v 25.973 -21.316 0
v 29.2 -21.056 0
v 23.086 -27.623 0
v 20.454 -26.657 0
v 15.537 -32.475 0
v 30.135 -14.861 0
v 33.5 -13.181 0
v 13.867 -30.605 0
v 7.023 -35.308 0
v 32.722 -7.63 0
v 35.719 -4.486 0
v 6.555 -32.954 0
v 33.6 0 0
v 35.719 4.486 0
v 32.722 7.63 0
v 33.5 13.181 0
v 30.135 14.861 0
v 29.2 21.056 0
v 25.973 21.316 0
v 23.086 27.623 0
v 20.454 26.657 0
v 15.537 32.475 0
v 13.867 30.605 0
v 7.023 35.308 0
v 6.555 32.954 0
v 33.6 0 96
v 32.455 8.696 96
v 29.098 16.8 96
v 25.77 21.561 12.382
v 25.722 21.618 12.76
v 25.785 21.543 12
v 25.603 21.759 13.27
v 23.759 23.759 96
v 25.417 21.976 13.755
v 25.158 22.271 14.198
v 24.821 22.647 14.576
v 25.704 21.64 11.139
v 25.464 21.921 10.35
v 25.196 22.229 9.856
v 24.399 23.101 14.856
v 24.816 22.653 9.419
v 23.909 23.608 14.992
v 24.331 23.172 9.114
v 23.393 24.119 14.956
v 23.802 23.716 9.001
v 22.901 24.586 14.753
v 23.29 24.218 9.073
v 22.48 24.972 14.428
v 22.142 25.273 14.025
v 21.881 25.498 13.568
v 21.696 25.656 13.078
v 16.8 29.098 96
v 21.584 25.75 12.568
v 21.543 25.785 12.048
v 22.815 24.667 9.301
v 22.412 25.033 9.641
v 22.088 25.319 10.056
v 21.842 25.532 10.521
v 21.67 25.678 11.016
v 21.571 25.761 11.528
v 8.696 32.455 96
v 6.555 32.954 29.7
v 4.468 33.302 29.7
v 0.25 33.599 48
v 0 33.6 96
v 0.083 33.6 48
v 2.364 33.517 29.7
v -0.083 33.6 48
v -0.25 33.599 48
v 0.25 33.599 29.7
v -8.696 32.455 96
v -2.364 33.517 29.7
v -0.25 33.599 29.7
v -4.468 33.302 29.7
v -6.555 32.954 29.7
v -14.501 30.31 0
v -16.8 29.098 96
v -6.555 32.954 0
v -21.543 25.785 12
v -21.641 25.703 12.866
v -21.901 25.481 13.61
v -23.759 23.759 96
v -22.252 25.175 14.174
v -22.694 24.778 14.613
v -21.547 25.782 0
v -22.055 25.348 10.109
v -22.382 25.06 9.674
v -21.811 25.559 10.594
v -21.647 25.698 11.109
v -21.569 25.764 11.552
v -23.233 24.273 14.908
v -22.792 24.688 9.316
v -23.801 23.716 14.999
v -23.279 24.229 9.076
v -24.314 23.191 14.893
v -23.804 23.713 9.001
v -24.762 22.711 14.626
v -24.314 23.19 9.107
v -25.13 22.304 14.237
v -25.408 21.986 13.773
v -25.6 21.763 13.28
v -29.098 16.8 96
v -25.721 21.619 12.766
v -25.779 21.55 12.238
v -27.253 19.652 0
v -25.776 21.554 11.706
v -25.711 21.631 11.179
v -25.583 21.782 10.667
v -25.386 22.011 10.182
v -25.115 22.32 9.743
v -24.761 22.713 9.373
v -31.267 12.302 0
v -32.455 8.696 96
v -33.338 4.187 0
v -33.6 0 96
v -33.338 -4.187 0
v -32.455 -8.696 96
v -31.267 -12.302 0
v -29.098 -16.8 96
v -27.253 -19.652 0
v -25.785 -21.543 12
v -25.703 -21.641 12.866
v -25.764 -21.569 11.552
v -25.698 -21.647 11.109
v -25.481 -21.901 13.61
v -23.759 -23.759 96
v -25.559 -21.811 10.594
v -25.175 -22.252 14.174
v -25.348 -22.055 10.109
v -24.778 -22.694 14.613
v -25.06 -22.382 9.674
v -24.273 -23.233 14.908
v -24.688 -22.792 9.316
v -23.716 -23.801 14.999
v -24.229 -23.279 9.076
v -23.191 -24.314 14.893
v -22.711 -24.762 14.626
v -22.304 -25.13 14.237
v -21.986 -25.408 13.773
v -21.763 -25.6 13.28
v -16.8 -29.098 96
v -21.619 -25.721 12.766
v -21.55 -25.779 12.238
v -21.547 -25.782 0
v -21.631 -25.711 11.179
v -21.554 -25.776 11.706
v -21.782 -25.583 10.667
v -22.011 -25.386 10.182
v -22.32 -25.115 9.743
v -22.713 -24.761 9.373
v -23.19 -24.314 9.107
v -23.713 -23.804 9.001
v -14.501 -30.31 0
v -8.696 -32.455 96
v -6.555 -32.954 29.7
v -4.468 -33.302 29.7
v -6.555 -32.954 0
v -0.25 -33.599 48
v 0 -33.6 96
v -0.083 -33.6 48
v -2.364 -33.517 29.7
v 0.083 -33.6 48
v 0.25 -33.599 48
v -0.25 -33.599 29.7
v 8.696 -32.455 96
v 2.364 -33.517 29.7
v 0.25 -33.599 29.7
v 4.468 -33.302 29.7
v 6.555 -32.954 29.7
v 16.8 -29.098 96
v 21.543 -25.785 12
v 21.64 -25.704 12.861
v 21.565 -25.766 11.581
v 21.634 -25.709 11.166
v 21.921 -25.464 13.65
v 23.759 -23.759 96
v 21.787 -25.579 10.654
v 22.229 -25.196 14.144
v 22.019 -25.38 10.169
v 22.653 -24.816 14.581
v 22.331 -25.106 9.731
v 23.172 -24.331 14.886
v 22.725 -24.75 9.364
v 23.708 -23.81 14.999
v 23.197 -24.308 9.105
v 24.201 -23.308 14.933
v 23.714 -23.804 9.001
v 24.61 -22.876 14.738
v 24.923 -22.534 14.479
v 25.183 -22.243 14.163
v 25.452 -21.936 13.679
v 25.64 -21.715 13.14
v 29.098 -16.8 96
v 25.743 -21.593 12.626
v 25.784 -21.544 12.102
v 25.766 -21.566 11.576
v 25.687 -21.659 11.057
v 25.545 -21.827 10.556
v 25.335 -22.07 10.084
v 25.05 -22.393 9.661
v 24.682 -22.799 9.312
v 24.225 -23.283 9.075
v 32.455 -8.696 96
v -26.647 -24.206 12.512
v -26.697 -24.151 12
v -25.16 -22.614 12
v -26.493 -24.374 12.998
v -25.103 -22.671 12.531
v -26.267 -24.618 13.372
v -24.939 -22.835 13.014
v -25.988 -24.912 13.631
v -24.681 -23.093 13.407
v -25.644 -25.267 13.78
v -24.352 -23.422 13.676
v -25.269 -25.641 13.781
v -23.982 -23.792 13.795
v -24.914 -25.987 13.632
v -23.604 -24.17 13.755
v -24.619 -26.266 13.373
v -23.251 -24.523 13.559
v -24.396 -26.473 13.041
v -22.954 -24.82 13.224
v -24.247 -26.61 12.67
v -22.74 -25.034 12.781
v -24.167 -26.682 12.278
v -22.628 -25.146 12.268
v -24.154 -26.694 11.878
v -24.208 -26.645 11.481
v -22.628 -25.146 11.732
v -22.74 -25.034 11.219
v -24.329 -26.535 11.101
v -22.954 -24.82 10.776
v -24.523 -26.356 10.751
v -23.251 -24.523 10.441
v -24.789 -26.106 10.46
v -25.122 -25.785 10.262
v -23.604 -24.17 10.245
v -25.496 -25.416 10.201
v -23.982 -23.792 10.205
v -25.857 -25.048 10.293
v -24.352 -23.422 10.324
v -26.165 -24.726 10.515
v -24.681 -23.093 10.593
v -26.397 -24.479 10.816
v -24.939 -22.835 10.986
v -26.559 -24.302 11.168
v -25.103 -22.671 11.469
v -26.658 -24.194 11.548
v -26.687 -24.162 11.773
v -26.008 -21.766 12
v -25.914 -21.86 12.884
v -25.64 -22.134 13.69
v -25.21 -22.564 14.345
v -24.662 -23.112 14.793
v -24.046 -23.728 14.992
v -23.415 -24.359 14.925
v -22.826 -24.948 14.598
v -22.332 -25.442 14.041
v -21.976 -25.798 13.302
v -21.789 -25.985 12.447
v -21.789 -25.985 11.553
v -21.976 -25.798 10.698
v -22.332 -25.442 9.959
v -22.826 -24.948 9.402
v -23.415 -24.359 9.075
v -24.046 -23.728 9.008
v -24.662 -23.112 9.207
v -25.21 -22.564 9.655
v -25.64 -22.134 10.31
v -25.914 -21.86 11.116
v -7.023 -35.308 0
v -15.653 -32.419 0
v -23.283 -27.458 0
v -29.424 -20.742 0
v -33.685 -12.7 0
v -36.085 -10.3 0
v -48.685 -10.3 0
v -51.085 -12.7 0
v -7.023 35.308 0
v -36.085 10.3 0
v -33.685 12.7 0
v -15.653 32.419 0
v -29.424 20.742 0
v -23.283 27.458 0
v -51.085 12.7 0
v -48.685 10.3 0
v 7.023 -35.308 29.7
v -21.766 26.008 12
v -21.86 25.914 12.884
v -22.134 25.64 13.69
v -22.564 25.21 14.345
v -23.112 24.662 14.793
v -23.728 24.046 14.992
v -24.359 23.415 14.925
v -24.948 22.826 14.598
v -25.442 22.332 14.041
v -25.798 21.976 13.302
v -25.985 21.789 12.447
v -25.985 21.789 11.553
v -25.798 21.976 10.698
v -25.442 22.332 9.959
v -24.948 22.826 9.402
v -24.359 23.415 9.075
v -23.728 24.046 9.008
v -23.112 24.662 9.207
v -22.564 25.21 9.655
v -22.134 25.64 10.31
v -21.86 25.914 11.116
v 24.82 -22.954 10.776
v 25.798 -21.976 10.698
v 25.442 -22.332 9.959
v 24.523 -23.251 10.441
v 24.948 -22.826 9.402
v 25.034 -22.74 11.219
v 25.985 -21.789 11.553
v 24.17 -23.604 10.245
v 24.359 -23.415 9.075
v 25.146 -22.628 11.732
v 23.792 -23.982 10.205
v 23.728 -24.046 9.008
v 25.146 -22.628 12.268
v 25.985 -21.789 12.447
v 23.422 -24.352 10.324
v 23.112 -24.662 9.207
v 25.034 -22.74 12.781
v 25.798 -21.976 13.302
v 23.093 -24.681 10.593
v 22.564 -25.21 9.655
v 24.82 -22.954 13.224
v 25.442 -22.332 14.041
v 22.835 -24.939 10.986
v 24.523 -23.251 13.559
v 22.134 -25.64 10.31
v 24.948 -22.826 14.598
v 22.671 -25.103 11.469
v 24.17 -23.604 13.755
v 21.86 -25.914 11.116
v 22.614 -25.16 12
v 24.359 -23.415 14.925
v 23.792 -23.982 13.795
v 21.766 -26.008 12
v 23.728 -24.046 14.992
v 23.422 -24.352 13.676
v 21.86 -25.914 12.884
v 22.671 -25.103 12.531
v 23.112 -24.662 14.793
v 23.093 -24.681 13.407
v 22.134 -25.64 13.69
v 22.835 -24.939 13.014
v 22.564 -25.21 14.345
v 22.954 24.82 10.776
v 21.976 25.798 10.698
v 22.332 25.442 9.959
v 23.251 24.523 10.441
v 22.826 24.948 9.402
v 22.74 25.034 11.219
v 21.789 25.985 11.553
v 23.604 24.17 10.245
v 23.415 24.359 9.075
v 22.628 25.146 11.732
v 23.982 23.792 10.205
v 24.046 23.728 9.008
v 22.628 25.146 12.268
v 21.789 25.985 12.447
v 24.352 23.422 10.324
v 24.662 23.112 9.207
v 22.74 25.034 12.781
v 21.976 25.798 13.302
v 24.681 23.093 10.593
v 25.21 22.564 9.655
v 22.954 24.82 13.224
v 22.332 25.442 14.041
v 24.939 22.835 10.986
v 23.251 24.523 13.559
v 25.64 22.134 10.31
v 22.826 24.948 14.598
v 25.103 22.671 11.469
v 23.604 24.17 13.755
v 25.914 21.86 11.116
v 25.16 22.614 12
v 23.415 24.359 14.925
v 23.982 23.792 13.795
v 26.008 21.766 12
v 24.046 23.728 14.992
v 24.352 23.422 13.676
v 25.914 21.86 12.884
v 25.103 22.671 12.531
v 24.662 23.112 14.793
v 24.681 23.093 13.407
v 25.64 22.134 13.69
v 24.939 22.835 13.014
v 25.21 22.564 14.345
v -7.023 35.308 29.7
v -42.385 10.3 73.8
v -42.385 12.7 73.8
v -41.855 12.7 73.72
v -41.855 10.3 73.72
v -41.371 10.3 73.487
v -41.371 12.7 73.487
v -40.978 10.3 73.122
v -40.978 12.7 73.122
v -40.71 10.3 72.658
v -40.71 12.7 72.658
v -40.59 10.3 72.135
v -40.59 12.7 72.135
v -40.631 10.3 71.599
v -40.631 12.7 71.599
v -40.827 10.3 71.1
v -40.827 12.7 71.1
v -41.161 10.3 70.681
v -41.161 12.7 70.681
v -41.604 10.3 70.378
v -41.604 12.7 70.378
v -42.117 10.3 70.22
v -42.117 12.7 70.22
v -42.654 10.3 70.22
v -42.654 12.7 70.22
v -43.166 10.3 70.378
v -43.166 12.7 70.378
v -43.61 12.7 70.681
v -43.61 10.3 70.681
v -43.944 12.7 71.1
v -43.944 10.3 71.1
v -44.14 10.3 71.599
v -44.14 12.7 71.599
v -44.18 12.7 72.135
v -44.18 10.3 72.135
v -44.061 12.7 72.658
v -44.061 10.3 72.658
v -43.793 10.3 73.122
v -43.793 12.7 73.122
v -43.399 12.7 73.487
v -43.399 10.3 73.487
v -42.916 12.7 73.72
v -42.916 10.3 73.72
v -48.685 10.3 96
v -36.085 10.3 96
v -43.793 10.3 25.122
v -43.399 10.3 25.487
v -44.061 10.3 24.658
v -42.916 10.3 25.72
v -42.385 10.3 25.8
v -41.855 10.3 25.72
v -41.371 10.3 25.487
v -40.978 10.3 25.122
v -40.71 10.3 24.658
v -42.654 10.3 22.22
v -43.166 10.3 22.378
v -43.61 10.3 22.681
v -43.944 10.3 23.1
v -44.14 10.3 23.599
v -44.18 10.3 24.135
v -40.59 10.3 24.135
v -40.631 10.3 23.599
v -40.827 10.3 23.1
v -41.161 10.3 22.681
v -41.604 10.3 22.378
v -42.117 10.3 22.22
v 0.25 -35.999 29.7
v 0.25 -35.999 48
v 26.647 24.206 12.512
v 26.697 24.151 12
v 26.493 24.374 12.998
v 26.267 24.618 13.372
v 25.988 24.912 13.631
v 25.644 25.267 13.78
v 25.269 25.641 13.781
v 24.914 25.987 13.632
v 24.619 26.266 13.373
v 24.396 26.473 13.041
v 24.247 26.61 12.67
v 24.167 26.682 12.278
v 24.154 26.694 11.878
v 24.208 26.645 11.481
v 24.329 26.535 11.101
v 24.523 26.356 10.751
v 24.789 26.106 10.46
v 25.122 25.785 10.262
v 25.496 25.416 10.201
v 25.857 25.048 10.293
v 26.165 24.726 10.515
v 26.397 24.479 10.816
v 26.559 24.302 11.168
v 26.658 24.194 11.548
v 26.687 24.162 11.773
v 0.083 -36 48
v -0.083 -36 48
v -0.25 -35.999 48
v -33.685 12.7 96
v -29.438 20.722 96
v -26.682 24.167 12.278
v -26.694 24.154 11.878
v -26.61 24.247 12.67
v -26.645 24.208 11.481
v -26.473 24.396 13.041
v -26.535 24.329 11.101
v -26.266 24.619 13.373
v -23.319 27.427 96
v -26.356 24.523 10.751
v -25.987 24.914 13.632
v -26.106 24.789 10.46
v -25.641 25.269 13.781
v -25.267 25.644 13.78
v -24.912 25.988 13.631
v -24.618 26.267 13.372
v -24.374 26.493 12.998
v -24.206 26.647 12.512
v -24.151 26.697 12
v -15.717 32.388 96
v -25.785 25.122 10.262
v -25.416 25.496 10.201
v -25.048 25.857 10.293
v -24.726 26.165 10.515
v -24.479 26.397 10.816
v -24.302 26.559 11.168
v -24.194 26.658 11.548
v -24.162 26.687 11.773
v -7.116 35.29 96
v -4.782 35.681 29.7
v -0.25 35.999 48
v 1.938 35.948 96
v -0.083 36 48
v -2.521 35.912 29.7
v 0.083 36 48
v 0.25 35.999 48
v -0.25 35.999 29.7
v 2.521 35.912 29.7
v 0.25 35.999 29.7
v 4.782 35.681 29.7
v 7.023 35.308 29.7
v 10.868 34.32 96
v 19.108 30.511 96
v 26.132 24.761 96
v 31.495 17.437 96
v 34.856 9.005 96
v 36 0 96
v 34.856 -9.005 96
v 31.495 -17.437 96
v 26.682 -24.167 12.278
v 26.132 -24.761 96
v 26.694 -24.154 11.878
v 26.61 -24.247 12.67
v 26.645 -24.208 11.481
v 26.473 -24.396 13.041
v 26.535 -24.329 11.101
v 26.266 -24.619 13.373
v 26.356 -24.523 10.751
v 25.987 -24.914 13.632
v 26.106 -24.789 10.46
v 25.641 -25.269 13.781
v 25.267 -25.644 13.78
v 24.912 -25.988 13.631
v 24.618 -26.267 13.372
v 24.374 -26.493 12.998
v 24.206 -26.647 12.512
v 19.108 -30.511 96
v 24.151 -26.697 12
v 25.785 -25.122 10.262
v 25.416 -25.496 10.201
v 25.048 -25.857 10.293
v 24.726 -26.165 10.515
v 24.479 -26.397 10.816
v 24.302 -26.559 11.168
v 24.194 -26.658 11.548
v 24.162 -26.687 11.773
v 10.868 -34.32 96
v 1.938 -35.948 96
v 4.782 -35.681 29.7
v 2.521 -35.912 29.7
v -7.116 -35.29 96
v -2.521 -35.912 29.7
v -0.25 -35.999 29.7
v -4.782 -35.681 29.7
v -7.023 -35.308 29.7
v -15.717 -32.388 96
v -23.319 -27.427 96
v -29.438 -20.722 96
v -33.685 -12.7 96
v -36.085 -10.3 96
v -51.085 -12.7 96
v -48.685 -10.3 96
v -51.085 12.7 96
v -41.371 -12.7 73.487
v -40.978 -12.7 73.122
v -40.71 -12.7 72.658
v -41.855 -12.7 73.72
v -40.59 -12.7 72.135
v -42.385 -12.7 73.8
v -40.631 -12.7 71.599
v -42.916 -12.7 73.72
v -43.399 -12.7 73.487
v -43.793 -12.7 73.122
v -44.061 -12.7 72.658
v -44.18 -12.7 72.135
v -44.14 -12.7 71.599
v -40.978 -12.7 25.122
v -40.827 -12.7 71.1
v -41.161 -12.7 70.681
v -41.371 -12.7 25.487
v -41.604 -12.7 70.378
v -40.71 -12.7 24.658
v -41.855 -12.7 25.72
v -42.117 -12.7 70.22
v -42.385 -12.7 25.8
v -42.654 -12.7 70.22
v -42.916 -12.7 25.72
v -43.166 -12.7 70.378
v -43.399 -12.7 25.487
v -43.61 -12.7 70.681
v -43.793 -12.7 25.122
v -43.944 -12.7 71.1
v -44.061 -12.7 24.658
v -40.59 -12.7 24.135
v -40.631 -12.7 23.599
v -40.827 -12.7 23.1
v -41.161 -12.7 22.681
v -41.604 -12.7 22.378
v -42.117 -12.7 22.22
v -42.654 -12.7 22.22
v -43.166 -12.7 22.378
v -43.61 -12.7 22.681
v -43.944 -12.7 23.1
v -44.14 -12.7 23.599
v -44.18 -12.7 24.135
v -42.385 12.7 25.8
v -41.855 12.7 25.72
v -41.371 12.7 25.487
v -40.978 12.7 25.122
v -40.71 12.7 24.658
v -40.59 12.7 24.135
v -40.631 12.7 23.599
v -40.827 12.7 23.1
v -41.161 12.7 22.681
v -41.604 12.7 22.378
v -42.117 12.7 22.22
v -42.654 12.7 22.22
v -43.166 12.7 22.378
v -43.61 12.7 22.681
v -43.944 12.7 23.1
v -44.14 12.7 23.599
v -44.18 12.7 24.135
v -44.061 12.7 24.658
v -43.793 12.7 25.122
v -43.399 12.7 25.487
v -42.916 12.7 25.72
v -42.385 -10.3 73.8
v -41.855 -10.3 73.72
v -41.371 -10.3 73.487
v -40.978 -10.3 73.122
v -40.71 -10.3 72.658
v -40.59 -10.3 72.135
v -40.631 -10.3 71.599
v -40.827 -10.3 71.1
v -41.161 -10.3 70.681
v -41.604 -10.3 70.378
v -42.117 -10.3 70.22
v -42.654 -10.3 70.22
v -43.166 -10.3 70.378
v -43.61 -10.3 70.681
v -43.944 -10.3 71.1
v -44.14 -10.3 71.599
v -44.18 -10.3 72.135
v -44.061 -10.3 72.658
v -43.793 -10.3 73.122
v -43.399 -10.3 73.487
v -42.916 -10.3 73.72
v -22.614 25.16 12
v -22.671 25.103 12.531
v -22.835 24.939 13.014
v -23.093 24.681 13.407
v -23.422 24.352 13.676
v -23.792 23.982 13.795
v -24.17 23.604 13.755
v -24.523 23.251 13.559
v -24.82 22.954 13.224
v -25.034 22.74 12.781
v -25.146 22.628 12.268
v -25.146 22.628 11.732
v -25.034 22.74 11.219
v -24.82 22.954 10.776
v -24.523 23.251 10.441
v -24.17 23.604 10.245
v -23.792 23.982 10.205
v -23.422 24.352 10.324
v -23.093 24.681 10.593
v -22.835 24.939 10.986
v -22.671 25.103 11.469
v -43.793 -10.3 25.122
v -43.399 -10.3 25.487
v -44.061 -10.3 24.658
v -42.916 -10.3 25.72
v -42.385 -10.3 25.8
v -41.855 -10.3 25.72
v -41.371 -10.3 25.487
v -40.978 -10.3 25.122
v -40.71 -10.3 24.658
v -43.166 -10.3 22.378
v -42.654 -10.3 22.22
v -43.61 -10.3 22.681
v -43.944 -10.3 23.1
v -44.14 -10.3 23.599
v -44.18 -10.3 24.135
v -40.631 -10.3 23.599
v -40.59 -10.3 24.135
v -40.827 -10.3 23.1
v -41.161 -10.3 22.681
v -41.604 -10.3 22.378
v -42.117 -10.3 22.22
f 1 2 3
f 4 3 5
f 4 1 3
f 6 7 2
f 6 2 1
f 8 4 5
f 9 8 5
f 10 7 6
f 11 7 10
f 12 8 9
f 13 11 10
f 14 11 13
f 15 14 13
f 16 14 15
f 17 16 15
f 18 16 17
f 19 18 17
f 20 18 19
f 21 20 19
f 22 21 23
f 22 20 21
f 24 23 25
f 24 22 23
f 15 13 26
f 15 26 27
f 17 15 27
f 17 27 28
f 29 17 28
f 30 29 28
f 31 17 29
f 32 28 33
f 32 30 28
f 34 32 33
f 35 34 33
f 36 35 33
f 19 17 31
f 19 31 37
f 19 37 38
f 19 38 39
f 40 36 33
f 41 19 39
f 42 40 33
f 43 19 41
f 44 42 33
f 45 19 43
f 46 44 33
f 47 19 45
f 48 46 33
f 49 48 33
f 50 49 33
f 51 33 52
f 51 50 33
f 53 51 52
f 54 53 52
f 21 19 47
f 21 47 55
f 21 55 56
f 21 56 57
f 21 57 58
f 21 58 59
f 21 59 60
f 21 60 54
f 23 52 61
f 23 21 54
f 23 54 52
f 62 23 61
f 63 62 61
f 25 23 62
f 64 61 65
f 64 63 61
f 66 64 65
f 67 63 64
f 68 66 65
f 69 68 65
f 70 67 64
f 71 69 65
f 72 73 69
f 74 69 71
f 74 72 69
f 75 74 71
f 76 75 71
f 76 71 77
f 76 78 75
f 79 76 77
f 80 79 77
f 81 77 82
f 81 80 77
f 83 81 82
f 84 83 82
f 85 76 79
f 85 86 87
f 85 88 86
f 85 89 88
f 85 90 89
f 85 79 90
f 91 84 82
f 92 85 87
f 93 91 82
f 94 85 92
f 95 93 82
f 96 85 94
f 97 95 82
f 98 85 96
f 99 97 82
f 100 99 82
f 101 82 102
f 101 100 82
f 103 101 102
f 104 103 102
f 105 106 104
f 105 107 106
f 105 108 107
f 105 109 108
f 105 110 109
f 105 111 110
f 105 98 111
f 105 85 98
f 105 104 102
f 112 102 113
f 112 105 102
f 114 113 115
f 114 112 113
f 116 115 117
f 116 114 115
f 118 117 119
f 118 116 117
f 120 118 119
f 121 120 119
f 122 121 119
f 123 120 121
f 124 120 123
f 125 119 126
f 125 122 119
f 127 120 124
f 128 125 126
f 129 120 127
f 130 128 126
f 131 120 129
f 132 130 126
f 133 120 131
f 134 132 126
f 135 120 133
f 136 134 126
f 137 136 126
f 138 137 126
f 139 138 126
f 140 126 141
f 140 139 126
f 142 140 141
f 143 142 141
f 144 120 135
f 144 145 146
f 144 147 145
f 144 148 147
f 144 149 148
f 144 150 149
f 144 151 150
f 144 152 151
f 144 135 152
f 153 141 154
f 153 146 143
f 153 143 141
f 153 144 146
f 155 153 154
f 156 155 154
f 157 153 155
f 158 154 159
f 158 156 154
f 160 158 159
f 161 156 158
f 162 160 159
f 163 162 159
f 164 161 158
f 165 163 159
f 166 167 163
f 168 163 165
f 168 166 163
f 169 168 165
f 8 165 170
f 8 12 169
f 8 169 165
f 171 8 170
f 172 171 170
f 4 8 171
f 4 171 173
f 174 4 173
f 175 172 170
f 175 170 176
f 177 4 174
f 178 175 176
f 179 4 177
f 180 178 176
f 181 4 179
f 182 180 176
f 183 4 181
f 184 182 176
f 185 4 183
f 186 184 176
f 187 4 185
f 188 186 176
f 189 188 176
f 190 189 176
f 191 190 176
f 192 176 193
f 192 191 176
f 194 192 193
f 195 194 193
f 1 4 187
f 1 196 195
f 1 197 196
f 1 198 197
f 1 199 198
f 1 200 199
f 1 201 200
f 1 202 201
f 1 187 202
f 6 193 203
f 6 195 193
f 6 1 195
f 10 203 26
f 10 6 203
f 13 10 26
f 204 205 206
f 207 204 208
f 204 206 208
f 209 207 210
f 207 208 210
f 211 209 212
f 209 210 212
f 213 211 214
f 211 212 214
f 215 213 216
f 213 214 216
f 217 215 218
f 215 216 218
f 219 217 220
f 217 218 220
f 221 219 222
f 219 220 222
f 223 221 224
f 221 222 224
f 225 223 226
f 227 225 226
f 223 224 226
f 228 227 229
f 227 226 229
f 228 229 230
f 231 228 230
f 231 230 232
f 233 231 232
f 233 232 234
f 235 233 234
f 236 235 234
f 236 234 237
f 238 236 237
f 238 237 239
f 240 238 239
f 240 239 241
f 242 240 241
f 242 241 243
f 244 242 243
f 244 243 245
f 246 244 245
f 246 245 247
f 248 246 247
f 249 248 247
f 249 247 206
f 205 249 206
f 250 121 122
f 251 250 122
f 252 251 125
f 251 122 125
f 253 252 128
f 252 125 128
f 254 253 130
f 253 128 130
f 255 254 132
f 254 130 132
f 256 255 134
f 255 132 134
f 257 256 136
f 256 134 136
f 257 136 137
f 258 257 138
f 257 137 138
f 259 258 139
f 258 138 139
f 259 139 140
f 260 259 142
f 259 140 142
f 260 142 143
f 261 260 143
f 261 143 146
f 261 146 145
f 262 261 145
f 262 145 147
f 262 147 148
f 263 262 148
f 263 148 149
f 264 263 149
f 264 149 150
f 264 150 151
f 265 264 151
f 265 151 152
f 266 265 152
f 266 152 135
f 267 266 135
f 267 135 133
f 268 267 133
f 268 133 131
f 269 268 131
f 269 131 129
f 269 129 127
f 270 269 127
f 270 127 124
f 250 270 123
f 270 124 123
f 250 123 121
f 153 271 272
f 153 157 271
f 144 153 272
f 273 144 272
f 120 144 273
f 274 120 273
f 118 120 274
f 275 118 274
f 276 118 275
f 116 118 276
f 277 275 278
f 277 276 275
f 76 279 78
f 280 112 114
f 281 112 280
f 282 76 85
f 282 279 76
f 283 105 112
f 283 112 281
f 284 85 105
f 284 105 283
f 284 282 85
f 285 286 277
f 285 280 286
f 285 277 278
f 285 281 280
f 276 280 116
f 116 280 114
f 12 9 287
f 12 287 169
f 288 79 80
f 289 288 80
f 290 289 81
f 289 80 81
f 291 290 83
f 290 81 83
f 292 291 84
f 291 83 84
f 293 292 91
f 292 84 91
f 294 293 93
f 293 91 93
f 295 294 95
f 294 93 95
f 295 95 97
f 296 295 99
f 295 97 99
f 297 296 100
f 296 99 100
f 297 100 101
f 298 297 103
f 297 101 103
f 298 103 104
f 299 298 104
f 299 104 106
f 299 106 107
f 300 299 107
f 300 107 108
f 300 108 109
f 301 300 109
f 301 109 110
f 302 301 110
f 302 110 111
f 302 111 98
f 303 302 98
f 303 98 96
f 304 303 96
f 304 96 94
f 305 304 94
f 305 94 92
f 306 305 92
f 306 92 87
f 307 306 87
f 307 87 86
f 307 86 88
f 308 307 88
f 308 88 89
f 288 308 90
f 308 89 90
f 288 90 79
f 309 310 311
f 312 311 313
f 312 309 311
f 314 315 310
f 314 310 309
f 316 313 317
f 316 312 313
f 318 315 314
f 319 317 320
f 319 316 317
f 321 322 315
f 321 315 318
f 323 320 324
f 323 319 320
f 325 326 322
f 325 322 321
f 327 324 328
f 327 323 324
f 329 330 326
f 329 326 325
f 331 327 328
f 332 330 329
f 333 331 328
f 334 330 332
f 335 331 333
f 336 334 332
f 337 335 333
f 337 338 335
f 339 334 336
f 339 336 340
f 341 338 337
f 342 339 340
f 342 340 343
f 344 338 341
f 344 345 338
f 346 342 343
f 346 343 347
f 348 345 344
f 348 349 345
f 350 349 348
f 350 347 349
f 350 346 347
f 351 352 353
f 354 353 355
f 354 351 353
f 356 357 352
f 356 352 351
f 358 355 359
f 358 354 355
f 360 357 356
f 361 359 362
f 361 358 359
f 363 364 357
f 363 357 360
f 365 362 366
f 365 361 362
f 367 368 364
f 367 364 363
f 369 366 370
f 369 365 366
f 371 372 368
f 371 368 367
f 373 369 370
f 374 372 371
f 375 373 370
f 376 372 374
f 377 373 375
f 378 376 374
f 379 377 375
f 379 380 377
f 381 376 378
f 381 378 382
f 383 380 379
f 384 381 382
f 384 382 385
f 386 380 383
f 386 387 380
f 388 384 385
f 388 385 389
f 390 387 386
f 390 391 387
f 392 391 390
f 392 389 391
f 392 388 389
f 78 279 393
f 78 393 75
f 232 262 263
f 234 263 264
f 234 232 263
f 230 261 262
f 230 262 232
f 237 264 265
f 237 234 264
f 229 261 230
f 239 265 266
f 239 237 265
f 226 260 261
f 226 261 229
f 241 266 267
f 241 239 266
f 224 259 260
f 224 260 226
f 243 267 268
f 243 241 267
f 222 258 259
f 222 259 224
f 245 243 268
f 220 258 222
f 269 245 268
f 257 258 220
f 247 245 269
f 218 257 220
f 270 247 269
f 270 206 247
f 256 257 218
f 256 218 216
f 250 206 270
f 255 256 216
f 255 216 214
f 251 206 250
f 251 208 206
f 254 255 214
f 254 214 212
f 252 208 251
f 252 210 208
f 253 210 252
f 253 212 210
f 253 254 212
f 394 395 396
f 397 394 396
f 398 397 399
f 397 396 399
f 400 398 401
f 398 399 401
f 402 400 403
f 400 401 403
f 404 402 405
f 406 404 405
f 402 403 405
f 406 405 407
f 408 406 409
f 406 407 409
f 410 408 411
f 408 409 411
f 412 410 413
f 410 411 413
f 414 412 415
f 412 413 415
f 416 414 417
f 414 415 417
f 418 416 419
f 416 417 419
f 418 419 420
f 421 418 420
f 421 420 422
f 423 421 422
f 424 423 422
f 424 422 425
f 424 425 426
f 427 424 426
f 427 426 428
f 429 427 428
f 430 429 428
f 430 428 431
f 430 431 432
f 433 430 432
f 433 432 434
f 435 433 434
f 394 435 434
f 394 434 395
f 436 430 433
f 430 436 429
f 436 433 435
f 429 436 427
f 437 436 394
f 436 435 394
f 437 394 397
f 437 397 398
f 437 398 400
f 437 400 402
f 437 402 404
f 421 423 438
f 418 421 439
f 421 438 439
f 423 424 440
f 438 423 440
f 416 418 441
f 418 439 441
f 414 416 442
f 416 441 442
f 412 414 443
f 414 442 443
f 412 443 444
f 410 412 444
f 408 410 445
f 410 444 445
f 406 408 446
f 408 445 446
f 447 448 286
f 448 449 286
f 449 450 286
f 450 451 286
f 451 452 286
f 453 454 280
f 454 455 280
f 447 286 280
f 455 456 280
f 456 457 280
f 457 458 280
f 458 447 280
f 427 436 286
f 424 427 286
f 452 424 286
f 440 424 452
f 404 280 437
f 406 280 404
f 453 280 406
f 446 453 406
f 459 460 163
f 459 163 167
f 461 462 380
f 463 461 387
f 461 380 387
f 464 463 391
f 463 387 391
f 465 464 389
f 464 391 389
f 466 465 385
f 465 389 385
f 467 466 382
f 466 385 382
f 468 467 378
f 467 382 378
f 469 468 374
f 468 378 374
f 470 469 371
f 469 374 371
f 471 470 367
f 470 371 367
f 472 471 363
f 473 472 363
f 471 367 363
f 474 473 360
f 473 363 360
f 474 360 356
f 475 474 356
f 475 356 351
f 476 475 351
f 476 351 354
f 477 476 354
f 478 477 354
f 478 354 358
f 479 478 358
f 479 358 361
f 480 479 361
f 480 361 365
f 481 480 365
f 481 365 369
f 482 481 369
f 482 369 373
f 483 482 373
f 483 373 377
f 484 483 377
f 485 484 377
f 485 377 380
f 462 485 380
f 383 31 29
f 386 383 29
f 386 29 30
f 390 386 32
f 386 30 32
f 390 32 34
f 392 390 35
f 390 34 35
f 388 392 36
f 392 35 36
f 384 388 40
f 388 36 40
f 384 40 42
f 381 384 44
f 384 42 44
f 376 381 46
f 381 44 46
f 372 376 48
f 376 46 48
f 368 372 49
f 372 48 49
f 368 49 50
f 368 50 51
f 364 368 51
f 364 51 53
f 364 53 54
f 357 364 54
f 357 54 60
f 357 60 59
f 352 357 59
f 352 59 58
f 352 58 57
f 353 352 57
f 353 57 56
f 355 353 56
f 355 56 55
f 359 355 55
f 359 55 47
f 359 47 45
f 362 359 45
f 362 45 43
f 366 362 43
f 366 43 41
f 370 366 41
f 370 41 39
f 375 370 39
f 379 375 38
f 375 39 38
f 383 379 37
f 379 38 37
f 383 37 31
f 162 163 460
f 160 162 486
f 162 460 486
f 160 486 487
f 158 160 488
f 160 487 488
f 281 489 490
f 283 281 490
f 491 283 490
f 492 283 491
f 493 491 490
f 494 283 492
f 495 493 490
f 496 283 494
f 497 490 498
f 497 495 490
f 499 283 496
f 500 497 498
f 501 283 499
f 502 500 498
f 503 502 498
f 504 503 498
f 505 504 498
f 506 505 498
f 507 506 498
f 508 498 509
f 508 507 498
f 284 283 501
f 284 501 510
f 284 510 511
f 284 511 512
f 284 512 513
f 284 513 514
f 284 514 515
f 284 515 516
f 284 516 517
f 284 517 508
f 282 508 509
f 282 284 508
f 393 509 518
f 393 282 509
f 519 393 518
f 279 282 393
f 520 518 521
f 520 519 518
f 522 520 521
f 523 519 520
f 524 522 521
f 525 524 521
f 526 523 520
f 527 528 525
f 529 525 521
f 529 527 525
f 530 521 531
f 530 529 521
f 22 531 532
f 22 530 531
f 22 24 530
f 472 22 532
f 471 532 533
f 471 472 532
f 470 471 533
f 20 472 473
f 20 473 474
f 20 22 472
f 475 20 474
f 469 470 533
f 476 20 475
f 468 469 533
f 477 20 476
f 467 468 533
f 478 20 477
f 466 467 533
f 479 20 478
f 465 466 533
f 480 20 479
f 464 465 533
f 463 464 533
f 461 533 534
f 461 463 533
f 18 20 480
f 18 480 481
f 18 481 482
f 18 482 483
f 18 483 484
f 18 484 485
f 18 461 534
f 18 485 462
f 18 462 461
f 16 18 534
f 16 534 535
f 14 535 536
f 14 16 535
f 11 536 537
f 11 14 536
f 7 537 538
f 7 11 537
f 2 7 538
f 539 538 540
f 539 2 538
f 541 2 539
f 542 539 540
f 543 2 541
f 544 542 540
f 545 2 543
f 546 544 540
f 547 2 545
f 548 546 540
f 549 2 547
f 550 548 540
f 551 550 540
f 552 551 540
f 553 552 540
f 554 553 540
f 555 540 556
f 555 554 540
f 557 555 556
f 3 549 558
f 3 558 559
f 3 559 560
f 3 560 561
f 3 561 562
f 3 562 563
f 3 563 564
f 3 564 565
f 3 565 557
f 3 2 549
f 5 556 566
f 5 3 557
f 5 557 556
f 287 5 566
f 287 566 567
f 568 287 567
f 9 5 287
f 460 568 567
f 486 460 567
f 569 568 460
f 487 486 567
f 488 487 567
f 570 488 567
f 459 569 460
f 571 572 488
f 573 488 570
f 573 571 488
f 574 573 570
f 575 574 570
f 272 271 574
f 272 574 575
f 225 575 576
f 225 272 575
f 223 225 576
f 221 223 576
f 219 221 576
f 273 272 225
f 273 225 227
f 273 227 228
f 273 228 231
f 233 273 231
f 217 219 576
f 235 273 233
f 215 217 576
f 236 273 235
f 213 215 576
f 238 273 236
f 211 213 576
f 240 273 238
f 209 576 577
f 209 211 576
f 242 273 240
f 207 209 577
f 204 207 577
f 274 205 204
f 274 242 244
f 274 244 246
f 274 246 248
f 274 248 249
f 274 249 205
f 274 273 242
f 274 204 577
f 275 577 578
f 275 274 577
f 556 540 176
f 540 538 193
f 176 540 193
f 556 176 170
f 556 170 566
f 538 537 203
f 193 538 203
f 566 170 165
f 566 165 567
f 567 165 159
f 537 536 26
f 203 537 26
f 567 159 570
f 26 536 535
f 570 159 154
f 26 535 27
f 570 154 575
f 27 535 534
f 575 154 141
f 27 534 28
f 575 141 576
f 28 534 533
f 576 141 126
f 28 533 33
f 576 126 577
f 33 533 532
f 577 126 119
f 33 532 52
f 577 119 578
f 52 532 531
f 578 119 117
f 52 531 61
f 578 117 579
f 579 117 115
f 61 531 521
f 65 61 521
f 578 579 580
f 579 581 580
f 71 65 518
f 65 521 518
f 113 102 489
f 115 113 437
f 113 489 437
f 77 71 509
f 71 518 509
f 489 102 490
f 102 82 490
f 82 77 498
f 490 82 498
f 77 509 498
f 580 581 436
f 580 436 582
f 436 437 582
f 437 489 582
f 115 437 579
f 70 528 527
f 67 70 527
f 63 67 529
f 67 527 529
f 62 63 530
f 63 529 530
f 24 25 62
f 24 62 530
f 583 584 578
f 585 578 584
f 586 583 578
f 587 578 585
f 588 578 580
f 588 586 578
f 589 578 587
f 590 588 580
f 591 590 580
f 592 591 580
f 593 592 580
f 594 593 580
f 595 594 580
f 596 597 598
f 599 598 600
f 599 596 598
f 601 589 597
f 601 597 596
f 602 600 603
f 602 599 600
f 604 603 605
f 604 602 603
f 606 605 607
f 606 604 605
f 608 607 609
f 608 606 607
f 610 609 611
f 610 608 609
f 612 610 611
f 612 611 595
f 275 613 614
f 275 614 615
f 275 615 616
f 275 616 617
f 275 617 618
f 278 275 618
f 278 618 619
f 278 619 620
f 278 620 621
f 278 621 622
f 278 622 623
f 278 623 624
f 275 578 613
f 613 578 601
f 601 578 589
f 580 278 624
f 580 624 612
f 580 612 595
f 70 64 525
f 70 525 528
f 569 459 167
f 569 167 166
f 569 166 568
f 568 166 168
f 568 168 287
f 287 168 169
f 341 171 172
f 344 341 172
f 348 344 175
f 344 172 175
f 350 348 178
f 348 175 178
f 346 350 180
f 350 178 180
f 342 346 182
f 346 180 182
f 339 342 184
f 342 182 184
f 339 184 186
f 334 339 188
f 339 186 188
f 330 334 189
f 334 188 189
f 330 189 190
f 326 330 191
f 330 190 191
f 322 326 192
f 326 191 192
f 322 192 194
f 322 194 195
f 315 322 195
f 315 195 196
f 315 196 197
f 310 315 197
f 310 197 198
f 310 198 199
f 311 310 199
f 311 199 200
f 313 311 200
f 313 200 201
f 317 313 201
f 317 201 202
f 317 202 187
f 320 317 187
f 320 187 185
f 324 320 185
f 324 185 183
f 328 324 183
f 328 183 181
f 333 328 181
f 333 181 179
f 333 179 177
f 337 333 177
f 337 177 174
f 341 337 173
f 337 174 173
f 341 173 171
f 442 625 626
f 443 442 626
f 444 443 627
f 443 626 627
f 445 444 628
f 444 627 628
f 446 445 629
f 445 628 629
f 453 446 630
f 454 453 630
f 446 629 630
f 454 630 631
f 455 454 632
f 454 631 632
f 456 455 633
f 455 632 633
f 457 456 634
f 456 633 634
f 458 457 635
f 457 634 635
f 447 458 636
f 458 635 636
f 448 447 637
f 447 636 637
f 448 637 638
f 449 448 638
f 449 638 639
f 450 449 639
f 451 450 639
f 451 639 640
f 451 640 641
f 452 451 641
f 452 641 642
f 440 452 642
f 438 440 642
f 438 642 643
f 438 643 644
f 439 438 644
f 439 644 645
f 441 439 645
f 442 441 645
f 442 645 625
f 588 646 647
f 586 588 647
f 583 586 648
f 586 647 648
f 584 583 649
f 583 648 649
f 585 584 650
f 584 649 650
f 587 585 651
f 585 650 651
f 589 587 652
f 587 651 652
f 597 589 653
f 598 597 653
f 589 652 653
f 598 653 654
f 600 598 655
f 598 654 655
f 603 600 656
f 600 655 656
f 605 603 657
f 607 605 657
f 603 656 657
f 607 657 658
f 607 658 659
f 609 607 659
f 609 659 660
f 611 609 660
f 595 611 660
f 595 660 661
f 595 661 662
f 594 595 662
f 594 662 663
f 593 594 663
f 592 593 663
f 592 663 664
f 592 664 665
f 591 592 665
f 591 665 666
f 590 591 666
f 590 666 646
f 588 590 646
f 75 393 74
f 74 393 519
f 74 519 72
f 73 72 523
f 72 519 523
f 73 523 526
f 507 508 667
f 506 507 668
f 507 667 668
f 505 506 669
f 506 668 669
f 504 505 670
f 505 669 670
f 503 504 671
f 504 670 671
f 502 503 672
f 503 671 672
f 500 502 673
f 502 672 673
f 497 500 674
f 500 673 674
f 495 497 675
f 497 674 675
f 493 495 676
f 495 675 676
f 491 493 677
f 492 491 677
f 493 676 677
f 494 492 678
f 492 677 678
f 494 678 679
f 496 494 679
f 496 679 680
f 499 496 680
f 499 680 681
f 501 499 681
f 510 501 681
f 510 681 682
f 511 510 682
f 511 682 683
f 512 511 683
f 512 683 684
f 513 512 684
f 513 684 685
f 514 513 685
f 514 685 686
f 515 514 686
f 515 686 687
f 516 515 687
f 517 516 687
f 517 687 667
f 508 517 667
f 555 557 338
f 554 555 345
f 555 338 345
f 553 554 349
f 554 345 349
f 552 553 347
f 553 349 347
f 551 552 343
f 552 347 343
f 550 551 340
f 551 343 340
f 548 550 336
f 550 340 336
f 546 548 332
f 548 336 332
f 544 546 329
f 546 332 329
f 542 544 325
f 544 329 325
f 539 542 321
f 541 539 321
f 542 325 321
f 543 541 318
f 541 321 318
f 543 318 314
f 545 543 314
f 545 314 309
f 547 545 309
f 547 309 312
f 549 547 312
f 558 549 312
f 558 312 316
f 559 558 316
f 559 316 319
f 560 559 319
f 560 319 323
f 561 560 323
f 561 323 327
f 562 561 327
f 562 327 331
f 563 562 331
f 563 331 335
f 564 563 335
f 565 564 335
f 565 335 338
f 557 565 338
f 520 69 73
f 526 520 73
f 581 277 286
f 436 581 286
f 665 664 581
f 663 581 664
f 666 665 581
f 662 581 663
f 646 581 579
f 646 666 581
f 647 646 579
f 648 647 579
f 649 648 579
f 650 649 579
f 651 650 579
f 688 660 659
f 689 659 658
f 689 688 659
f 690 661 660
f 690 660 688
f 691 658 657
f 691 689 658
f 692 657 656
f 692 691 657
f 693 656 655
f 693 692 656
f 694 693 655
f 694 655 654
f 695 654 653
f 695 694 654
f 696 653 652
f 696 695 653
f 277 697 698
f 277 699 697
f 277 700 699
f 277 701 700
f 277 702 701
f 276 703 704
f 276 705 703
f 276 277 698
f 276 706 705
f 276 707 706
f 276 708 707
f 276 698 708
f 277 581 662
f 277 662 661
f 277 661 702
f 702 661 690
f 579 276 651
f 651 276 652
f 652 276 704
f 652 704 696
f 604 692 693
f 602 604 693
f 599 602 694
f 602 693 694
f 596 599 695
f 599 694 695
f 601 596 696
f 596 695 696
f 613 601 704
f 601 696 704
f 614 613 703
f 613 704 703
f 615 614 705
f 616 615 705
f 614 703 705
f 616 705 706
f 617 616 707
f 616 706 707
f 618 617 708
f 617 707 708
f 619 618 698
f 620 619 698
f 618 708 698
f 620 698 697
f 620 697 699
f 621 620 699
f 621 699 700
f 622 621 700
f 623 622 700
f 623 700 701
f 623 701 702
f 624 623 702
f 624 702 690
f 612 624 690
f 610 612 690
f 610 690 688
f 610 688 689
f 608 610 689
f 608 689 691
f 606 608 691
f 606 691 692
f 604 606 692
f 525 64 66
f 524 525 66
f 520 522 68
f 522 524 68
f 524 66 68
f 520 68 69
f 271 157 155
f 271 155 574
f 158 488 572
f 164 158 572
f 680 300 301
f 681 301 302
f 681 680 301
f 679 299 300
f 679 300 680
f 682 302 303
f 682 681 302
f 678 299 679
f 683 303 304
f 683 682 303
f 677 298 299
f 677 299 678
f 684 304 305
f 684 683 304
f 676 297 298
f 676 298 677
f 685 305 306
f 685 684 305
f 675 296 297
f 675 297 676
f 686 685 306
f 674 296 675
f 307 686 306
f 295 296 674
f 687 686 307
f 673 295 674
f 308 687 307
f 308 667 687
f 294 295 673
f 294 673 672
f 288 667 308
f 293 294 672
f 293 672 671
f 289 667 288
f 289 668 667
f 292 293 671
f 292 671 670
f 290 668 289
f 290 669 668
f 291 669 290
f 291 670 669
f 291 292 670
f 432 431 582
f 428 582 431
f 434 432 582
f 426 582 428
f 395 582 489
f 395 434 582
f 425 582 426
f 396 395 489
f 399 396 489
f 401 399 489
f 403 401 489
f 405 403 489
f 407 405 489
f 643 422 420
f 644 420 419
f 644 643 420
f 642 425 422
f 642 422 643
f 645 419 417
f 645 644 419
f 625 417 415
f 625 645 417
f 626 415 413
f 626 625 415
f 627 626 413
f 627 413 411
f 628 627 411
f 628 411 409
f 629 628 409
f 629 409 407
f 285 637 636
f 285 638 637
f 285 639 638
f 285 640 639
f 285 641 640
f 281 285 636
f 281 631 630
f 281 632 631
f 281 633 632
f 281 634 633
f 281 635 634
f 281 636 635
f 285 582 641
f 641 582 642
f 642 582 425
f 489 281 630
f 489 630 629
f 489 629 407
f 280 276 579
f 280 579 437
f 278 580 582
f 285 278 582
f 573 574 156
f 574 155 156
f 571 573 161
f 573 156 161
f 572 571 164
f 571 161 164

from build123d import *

# Parameters (mm, degrees)
SKETCH1_R                = 33.6
SKETCH1_W                = 12.6
SKETCH1_H                = 20.6
BOSS_EXTRUDE1_DEPTH      = 96
CUT_EXTRUDE1_DEPTH       = 115.550093395
CUT_EXTRUDE1_DEPTH_BACK  = 115.550093395
SKETCH2_W                = 48
SKETCH2_H                = 0.5
BOSS_EXTRUDE2_REACH      = 130.771
BOSS_EXTRUDE2_END_RADIUS = 33.6
SKETCH3_R                = 3
SKETCH4_R                = 3
CUT_EXTRUDE2_DEPTH       = 10.2
SKETCH5_R                = 1.8
CUT_EXTRUDE3_DEPTH       = 136.732562696
CIRPATTERN1_COUNT        = 4
SKETCH12_R               = 1.8
CUT_EXTRUDE7_DEPTH       = 120.152901457
CUT_EXTRUDE8_DEPTH       = 115.55009351
CUT_EXTRUDE8_DEPTH_BACK  = 115.55009351
SKETCH13_W               = 12
SKETCH13_H               = 29.4
CUT_EXTRUDE10_DEPTH      = 29.7


with BuildPart() as part:
    # Sketch1 → Boss-Extrude1 (new body)
    with BuildSketch(Plane.XY):
        with BuildLine():
            Line((-51.085456803, 12.7), (-33.685456803, 12.7))
            ThreePointArc((-33.685456803, 12.7), (36, 0), (-33.685456803, -12.7))
            Line((-33.685456803, -12.7), (-51.085456803, -12.7))
            Line((-51.085456803, -12.7), (-51.085456803, 12.7))
        make_face()
        Circle(SKETCH1_R, mode=Mode.SUBTRACT)
        with Locations((-42.385456803, 0)):
            Rectangle(SKETCH1_W, SKETCH1_H, mode=Mode.SUBTRACT)
    extrude(amount=BOSS_EXTRUDE1_DEPTH)

    # Sketch2 → Cut-Extrude1 (cut, two sides: drawn at the far end of the back side and taken through both)
    with BuildSketch(Plane(origin=(0, 0, 0), x_dir=(0, 0, -1), z_dir=(0, 1, 0)).offset(-CUT_EXTRUDE1_DEPTH_BACK)):
        with Locations((-24, 0)):
            Rectangle(SKETCH2_W, SKETCH2_H)
    extrude(amount=CUT_EXTRUDE1_DEPTH + CUT_EXTRUDE1_DEPTH_BACK, mode=Mode.SUBTRACT)

    # Boss-Extrude2: up to this cylinder (the profile starts inside it)
    boss_extrude2_end = Plane(origin=(0, 0, 12), z_dir=(0, 0, -1)) * Cylinder(BOSS_EXTRUDE2_END_RADIUS, 329.742, mode=Mode.PRIVATE)
    # Sketch3 → Boss-Extrude2 (add, up to the surface)
    with BuildSketch(Plane(origin=(16.674534964, 16.674534964, 0), x_dir=(0, 0, -1), z_dir=(0.7071067811865488, 0.7071067811865464, 0)), mode=Mode.PRIVATE) as boss_extrude2_sk1:
        with Locations(Location((-12, 0, 0), (0, 0, 270))):
            Circle(SKETCH3_R)
    boss_extrude2_tool1 = extrude(boss_extrude2_sk1.sketch, amount=BOSS_EXTRUDE2_REACH, mode=Mode.PRIVATE) & boss_extrude2_end
    add(boss_extrude2_tool1.solids().sort_by_distance((16.674535, 16.674535, 12))[0])

    # Sketch4 → Cut-Extrude2 (cut)
    with BuildSketch(Plane(origin=(16.674534964, 16.674534964, 0), x_dir=(0, 0, 1), z_dir=(-0.7071067811865487, -0.7071067811865465, 0))):
        with Locations(Location((12, 0, 0), (0, 0, 270))):
            Circle(SKETCH4_R)
    cut_extrude2 = extrude(amount=-CUT_EXTRUDE2_DEPTH, mode=Mode.SUBTRACT)

    # Sketch5 → Cut-Extrude3 (cut, through all)
    with BuildSketch(Plane(origin=(23.887024132, 23.887024132, 0), x_dir=(0, 0, 1), z_dir=(-0.7071067811865486, -0.7071067811865465, 0))):
        with Locations(Location((12, 0, 0), (0, 0, 270))):
            Circle(SKETCH5_R)
    cut_extrude3 = extrude(amount=-CUT_EXTRUDE3_DEPTH, mode=Mode.SUBTRACT)

    # CirPattern1: Cut-Extrude2, Cut-Extrude3 ×4 about axis
    cirpattern1_axis = Axis((0, 0, 0), (0, 0, 1))
    add([cut_extrude2.rotate(cirpattern1_axis, i * 360 / CIRPATTERN1_COUNT) for i in range(1, CIRPATTERN1_COUNT)], mode=Mode.SUBTRACT)
    add([cut_extrude3.rotate(cirpattern1_axis, i * 360 / CIRPATTERN1_COUNT) for i in range(1, CIRPATTERN1_COUNT)], mode=Mode.SUBTRACT)

    # Sketch12 → Cut-Extrude7 (cut, through all)
    with BuildSketch(Plane(origin=(0, 12.7, 0), x_dir=(1, 0, 0), z_dir=(0, 1, 0))):
        with Locations(Location((-42.385456803, -24, 0), (0, 0, 270))):
            Circle(SKETCH12_R)
        with Locations(Location((-42.385456803, -72, 0), (0, 0, 270))):
            Circle(SKETCH12_R)
    extrude(amount=-CUT_EXTRUDE7_DEPTH, mode=Mode.SUBTRACT)

    # Sketch13 → Cut-Extrude8 (cut, two sides: drawn at the far end of the back side and taken through both)
    with BuildSketch(Plane(origin=(0, 0, 0), x_dir=(1, 0, 0), z_dir=(0, 1, 0)).offset(-CUT_EXTRUDE8_DEPTH_BACK)):
        with Locations((0, -14.7)):
            Rectangle(SKETCH13_W, SKETCH13_H)
    extrude(amount=CUT_EXTRUDE8_DEPTH + CUT_EXTRUDE8_DEPTH_BACK, mode=Mode.SUBTRACT)

    # Sketch15 → Cut-Extrude10 (cut)
    with BuildSketch(Plane(origin=(0, 0, 0), x_dir=(-1, 0, 0), z_dir=(0, 0, -1))):
        with BuildLine():
            Line((-7.023251593, -35.308270095), (-6.55503482, -32.954385422))
            ThreePointArc((-6.55503482, -32.954385422), (0, -33.6), (6.55503482, -32.954385422))
            Line((6.55503482, -32.954385422), (7.023251593, -35.308270095))
            ThreePointArc((7.023251593, -35.308270095), (0, -36), (-7.023251593, -35.308270095))
        make_face()
        with BuildLine():
            Line((7.023251593, 35.308270095), (6.55503482, 32.954385422))
            ThreePointArc((6.55503482, 32.954385422), (0, 33.6), (-6.55503482, 32.954385422))
            Line((-6.55503482, 32.954385422), (-7.023251593, 35.308270095))
            ThreePointArc((-7.023251593, 35.308270095), (0, 36), (7.023251593, 35.308270095))
        make_face()
    extrude(amount=-CUT_EXTRUDE10_DEPTH, mode=Mode.SUBTRACT)


solid = part.part
